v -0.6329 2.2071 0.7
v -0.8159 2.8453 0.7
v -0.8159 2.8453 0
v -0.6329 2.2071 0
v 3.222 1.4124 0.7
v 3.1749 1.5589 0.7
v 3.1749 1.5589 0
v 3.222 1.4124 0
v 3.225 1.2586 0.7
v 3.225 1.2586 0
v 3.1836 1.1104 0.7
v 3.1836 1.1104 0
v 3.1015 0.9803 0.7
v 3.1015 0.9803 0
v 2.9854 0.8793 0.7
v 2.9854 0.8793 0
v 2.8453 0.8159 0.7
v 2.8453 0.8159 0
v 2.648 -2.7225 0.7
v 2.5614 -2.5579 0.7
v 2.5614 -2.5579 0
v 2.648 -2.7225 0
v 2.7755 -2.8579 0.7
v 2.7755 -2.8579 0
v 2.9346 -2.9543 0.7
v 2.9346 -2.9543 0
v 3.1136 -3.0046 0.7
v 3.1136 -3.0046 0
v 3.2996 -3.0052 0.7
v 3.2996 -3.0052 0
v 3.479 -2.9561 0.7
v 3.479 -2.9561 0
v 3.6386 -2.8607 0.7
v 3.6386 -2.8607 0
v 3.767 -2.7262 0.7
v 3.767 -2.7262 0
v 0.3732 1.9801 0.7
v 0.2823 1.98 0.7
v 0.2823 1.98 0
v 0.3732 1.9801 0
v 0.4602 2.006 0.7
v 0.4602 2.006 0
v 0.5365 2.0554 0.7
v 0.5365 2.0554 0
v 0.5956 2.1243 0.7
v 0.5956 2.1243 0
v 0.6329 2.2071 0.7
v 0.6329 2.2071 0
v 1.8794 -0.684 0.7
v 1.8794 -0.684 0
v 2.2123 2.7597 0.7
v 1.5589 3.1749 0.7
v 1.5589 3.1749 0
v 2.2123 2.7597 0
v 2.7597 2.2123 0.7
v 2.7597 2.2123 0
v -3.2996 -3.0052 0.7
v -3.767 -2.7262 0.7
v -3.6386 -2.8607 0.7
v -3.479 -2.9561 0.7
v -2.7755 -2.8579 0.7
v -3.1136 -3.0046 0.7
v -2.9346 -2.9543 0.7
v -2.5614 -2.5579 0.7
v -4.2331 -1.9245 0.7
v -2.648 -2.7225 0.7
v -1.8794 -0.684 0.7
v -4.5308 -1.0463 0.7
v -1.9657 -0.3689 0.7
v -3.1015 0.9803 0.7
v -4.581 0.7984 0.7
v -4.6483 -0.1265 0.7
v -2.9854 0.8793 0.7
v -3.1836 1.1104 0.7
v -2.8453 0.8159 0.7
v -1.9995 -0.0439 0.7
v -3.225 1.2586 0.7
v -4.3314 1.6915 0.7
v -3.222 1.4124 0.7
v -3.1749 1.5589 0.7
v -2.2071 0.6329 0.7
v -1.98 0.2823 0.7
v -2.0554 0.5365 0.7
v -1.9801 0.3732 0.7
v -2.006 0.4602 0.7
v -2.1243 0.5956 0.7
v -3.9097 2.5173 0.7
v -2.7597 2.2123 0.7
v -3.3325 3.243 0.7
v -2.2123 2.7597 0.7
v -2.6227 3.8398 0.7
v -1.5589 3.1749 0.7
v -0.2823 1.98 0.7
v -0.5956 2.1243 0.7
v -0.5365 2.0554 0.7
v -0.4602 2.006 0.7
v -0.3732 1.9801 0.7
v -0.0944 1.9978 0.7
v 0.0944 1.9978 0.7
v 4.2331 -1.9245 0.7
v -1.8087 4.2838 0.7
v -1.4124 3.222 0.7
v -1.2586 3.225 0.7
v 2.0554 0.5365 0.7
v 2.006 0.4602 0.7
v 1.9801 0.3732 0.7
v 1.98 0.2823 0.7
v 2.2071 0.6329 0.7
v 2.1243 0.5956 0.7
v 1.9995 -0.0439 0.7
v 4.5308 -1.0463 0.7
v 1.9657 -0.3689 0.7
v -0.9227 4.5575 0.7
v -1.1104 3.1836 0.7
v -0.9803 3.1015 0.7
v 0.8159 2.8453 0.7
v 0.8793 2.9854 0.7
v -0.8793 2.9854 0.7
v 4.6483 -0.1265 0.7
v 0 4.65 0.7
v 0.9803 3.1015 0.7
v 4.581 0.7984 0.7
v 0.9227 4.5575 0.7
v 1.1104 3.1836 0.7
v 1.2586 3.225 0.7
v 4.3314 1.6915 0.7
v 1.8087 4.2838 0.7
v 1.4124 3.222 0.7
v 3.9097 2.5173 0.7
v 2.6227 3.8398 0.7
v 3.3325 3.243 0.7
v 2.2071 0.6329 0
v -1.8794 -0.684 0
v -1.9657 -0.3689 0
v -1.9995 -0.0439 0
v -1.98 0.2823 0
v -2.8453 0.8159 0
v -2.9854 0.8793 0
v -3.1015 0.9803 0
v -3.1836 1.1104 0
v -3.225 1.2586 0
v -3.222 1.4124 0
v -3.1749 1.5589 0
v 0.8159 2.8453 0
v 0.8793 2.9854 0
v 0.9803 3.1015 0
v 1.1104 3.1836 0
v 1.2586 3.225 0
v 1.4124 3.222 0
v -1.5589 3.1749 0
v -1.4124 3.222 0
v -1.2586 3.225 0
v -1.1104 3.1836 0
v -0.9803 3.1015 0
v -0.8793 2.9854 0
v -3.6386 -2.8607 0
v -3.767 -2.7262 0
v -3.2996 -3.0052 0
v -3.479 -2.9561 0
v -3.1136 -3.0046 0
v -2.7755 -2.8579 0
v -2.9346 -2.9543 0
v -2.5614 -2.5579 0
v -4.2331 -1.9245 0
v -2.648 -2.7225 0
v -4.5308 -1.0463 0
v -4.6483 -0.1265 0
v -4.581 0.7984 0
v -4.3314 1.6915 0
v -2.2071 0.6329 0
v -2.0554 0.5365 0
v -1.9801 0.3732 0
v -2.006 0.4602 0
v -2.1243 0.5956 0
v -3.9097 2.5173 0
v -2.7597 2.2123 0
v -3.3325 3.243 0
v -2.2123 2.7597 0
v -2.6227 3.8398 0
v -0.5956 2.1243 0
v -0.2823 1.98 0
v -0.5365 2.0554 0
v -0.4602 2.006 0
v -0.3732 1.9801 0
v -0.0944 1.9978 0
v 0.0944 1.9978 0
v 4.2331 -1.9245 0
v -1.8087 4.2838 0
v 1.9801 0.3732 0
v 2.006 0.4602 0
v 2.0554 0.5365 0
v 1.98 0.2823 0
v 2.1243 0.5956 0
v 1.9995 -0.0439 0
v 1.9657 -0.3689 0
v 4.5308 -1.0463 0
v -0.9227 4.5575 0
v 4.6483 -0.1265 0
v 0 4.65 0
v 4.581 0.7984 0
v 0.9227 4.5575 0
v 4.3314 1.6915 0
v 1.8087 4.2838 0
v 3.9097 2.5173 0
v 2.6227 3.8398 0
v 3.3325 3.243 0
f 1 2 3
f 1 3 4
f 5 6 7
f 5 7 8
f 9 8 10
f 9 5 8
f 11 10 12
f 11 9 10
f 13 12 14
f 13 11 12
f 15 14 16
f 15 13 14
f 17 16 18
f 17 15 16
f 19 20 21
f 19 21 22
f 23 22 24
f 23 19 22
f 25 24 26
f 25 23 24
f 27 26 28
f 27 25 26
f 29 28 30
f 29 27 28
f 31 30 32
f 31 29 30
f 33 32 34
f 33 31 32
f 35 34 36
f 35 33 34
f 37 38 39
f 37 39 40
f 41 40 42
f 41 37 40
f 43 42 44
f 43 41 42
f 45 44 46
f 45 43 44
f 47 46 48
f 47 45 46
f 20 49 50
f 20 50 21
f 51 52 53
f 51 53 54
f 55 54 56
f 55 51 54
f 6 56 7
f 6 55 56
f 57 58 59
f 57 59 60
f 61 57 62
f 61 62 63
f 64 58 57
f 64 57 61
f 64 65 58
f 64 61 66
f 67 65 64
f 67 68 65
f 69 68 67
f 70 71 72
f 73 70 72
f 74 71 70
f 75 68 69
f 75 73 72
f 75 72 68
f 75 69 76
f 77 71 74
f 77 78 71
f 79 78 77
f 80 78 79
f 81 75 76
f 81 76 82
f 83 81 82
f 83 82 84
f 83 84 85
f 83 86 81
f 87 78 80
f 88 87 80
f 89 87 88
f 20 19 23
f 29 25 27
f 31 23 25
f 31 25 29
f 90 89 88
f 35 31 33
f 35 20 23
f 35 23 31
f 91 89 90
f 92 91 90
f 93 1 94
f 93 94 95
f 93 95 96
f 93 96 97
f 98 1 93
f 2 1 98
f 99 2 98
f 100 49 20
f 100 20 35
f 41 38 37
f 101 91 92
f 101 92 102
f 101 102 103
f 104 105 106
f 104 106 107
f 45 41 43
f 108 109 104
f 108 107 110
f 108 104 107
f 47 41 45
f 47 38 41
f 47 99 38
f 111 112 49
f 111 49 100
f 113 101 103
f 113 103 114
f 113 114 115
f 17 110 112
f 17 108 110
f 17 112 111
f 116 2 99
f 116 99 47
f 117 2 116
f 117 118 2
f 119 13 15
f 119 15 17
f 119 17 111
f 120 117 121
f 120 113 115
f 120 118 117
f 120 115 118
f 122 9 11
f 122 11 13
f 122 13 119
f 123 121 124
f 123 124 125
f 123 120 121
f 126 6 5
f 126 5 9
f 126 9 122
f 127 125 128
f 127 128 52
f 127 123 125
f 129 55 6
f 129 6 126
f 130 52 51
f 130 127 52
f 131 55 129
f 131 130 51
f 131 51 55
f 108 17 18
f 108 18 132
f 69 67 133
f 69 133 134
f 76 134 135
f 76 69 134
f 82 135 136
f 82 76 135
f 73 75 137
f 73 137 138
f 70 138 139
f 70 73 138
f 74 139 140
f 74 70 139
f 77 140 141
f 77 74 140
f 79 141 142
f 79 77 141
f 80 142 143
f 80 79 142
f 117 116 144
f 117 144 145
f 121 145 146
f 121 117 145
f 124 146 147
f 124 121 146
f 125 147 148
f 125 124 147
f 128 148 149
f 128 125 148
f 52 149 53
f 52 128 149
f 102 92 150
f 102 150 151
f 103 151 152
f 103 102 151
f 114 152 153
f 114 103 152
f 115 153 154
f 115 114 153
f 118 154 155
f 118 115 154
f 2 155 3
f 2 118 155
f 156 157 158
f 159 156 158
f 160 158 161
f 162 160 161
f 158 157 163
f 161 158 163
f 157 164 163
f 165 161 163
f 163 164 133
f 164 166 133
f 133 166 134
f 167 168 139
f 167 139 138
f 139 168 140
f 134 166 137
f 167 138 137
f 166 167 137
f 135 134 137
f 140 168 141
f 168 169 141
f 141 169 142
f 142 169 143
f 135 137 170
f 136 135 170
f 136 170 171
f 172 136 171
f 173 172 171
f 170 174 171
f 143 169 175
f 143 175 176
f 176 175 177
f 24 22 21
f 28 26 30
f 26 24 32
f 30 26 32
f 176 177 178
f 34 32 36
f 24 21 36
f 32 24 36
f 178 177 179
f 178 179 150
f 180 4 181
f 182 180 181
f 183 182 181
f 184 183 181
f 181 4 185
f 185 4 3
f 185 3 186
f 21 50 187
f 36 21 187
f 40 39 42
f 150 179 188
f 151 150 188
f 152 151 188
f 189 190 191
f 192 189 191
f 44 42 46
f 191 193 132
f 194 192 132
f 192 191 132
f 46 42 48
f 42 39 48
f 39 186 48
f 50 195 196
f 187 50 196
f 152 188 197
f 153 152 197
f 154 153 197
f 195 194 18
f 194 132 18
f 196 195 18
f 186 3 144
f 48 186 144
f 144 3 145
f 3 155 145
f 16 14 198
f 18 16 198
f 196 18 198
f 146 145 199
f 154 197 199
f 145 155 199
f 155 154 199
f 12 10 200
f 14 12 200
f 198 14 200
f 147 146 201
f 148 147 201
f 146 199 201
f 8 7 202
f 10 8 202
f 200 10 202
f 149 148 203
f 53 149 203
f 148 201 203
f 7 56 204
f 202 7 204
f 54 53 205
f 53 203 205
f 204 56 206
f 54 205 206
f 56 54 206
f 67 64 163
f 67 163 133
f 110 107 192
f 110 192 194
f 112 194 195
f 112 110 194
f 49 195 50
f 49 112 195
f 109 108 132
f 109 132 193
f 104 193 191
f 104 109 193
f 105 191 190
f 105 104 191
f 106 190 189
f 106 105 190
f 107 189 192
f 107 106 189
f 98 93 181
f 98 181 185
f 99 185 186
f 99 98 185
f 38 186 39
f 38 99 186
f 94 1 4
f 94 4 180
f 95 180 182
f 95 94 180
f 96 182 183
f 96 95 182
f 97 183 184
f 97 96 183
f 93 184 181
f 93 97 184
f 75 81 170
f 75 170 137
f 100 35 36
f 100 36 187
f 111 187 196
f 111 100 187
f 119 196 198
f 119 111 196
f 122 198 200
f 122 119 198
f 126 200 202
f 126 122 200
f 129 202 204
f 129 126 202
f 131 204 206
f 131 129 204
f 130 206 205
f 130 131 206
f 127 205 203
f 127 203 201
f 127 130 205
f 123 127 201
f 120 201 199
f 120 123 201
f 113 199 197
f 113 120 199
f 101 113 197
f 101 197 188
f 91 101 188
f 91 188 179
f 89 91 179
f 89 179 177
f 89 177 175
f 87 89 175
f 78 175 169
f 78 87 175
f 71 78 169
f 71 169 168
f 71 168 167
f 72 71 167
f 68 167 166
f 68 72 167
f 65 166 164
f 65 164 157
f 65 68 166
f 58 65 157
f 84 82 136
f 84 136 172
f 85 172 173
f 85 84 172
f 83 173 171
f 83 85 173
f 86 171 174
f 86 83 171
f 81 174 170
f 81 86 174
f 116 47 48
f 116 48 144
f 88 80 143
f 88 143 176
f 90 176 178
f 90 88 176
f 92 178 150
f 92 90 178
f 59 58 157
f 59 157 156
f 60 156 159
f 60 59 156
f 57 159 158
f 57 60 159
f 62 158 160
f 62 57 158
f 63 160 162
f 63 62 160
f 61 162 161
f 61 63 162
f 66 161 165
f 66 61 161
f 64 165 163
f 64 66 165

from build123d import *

# Parameters (mm, degrees)
BOSS_EXTRU_1_DEPTH = 0.7


with BuildPart() as part:
    # Esquisse1 → Boss.-Extru.1 (new body)
    with BuildSketch(Plane.XY.offset(0.7)):
        with BuildLine():
            Line((0.632886418, 2.207137237), (0.815865574, 2.845261388))
            ThreePointArc((0.815865574, 2.845261388), (1.110405111, 3.18363768), (1.558931601, 3.174917521))
            ThreePointArc((1.558931601, 3.174917521), (2.501036685, 2.501036685), (3.174917521, 1.558931601))
            ThreePointArc((3.174917521, 1.558931601), (3.18363768, 1.110405111), (2.845261388, 0.815865574))
            Line((2.845261388, 0.815865574), (2.207137237, 0.632886418))
            ThreePointArc((2.207137237, 0.632886418), (2.027919172, 0.500132947), (1.979974043, 0.282316824))
            ThreePointArc((1.979974043, 0.282316824), (1.989252382, -0.2070627), (1.879385242, -0.684040287))
            Line((1.879385242, -0.684040287), (2.561408424, -2.557883579))
            ThreePointArc((2.561408424, -2.557883579), (3.113603209, -3.004615598), (3.76702433, -2.726174553))
            ThreePointArc((3.76702433, -2.726174553), (0, 4.65), (-3.76702433, -2.726174553))
            ThreePointArc((-3.76702433, -2.726174553), (-3.113603209, -3.004615598), (-2.561408424, -2.557883579))
            Line((-2.561408424, -2.557883579), (-1.879385242, -0.684040287))
            ThreePointArc((-1.879385242, -0.684040287), (-1.989252382, -0.2070627), (-1.979974043, 0.282316824))
            ThreePointArc((-1.979974043, 0.282316824), (-2.027919172, 0.500132947), (-2.207137237, 0.632886418))
            Line((-2.207137237, 0.632886418), (-2.845261388, 0.815865574))
            ThreePointArc((-2.845261388, 0.815865574), (-3.18363768, 1.110405111), (-3.174917521, 1.558931601))
            ThreePointArc((-3.174917521, 1.558931601), (-2.501036685, 2.501036685), (-1.558931601, 3.174917521))
            ThreePointArc((-1.558931601, 3.174917521), (-1.110405111, 3.18363768), (-0.815865574, 2.845261388))
            Line((-0.815865574, 2.845261388), (-0.632886418, 2.207137237))
            ThreePointArc((-0.632886418, 2.207137237), (-0.500132947, 2.027919172), (-0.282316824, 1.979974043))
            ThreePointArc((-0.282316824, 1.979974043), (0, 2), (0.282316824, 1.979974043))
            ThreePointArc((0.282316824, 1.979974043), (0.500132947, 2.027919172), (0.632886418, 2.207137237))
        make_face()
    extrude(amount=-BOSS_EXTRU_1_DEPTH)


solid = part.part
